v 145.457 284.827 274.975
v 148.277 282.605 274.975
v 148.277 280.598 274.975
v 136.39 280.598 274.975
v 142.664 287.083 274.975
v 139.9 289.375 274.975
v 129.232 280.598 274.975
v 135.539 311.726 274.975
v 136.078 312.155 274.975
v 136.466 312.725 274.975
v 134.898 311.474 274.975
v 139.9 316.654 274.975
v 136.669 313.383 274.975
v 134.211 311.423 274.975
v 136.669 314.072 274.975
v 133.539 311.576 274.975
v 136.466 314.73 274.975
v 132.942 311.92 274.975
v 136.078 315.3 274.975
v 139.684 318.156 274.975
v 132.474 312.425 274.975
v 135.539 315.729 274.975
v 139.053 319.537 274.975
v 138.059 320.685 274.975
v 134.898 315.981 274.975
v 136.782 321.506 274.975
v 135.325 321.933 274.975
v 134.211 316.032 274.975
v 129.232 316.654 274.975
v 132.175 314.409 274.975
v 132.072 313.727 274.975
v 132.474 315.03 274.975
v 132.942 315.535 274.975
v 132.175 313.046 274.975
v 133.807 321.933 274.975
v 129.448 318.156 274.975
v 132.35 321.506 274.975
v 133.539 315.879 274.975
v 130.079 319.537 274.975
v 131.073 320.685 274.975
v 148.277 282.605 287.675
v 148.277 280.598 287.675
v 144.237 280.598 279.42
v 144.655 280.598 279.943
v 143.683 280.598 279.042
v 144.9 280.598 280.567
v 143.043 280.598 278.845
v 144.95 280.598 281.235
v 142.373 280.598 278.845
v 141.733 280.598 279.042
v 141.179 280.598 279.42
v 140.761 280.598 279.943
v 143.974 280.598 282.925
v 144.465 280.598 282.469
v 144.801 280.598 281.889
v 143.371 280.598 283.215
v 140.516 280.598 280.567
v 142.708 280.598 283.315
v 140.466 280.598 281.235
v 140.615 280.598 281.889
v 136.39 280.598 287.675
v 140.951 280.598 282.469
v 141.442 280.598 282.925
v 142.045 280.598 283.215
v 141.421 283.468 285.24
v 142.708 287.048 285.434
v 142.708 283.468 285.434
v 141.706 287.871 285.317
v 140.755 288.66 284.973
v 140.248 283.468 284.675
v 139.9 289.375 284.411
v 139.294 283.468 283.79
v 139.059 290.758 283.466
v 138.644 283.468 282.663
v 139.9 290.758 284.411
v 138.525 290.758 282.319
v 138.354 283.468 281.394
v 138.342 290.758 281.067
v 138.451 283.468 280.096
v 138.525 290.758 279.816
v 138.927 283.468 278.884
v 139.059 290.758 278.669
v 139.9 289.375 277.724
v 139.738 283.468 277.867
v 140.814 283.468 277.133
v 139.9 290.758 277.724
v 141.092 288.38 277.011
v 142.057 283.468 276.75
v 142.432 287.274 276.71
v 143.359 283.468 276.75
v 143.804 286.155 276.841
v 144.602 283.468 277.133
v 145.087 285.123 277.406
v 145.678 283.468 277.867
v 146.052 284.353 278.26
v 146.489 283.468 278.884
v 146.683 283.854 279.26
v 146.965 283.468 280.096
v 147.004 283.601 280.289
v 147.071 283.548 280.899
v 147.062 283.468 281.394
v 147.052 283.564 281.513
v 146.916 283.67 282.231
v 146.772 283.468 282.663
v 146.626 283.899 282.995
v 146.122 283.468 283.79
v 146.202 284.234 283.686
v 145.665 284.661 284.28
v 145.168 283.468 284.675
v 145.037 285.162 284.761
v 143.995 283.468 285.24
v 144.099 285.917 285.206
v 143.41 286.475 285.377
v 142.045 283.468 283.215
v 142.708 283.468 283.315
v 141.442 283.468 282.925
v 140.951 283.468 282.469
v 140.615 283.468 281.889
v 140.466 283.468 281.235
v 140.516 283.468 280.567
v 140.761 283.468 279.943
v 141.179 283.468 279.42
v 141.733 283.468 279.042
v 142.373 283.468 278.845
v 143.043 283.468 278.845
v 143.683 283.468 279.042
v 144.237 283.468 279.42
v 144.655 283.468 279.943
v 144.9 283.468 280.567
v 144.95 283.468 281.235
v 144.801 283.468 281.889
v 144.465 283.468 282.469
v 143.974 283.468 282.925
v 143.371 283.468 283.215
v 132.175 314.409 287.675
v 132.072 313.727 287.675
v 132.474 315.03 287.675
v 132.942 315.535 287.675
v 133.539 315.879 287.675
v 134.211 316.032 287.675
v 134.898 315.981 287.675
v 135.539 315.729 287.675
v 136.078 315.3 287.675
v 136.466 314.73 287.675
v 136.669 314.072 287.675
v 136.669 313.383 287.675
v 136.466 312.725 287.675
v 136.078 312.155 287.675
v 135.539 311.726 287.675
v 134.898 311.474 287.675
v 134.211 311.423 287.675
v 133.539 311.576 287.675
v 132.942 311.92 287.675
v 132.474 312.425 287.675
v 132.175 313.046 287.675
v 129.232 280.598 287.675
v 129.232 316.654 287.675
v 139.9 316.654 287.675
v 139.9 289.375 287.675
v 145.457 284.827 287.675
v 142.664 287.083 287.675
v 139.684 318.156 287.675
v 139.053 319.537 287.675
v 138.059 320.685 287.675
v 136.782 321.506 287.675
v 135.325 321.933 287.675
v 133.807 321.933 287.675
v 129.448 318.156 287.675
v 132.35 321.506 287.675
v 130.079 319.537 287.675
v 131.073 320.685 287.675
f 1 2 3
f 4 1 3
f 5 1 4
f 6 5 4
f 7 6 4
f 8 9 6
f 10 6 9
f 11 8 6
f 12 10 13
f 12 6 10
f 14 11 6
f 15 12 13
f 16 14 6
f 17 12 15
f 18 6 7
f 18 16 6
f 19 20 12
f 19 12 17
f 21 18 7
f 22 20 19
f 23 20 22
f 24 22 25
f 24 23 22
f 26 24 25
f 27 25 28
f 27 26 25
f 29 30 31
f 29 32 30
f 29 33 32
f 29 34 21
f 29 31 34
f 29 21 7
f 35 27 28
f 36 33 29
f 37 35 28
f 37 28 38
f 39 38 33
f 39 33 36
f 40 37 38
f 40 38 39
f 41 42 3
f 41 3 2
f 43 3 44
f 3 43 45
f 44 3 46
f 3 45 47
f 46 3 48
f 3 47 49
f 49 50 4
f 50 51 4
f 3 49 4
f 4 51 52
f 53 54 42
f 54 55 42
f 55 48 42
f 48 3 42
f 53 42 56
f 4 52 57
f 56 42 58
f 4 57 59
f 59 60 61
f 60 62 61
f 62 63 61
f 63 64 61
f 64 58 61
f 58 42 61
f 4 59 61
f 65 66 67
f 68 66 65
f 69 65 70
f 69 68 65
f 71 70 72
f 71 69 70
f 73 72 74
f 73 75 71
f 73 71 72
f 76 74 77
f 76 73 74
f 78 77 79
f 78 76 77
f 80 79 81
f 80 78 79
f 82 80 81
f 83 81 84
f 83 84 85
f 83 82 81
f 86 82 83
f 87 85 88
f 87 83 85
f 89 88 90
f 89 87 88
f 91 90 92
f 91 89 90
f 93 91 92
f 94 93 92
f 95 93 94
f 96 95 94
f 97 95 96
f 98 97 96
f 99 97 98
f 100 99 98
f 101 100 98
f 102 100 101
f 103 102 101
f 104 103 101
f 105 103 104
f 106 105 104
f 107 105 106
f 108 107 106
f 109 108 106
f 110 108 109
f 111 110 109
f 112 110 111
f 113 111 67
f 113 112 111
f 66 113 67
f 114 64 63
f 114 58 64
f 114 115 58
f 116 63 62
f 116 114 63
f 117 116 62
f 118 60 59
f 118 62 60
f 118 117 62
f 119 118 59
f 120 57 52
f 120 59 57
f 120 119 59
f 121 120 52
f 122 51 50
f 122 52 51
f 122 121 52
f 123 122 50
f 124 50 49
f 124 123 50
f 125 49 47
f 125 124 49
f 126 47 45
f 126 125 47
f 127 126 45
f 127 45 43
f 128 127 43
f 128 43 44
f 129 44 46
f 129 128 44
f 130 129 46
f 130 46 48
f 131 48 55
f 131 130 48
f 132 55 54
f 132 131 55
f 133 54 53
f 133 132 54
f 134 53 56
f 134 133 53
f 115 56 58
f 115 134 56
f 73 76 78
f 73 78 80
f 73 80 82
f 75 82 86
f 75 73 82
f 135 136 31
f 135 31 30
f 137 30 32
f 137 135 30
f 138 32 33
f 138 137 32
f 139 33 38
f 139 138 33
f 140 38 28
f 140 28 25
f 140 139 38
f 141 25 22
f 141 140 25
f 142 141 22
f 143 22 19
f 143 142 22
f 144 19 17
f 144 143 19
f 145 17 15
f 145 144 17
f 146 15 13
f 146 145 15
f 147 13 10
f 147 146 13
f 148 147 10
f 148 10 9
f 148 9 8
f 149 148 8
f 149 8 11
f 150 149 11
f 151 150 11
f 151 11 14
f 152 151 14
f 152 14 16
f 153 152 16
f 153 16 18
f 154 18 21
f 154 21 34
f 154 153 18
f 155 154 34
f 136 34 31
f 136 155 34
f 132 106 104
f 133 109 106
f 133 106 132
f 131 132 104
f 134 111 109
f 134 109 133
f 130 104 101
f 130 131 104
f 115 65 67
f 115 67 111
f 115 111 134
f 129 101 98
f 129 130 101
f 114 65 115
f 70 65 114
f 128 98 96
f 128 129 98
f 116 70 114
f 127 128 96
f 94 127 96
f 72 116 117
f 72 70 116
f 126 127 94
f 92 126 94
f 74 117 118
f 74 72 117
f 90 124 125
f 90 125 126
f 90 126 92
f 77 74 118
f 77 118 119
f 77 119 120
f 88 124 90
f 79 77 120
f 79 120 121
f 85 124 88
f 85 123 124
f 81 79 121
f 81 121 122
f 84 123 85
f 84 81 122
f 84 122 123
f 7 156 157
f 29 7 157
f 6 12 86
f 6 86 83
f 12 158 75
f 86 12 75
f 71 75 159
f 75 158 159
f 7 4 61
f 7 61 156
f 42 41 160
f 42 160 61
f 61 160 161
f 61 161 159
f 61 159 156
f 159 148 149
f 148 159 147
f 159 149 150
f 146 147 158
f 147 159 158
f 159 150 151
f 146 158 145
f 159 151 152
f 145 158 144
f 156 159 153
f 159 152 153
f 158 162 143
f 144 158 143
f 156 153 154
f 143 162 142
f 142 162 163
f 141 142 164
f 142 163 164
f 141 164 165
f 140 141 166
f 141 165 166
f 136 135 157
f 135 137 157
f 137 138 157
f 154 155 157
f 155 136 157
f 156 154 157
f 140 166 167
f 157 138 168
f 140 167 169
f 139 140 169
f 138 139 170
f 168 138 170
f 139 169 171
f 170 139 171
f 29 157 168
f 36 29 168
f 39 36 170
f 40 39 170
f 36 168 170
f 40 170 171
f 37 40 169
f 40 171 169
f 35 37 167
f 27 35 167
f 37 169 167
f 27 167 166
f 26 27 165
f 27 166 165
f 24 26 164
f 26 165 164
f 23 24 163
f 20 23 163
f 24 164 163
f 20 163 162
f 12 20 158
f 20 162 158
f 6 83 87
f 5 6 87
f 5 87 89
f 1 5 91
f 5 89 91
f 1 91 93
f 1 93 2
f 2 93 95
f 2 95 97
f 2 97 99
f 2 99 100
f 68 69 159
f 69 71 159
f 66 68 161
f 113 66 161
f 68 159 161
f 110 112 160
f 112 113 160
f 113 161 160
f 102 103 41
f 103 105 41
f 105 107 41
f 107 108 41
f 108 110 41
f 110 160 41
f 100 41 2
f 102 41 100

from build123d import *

# Parameters (mm, degrees)
SKETCH1_R           = 2.3114
BOSS_EXTRUDE1_DEPTH = 12.7
SKETCH2_R           = 2.3114
CUT_EXTRUDE1_DEPTH  = 12.7
SKETCH6_W           = 14.121517248
SKETCH6_H           = 29.833964346
CUT_EXTRUDE2_DEPTH  = 12.7
SKETCH7_W           = 28.687814756
SKETCH7_H           = 15.668419498
CUT_EXTRUDE3_DEPTH  = 12.7


with BuildPart() as part:
    # Sketch1 → Boss-Extrude1 (new body)
    with BuildSketch(Plane(origin=(0, 0, 287.67498399), x_dir=(-1, 0, 0), z_dir=(0, 0, -1))):
        with BuildLine():
            Line((-152.251778141, 257.179185564), (-150.258610496, 257.179185564))
            Line((-150.258610496, 257.179185564), (-150.258610494, 278.616785564))
            ThreePointArc((-150.258610494, 278.616785564), (-149.678330448, 280.017705521), (-148.277410491, 280.597985567))
            Line((-148.277410491, 280.597985567), (-136.390210491, 280.597985564))
            Line((-136.390210491, 280.597985564), (-136.390210491, 279.429585564))
            Line((-136.390210491, 279.429585564), (-148.277410491, 279.429585567))
            ThreePointArc((-148.277410491, 279.429585567), (-148.852146887, 279.19152196), (-149.090210496, 278.616785564))
            Line((-149.090210496, 278.616785564), (-149.090210494, 277.111994182))
            Line((-149.090210494, 277.111994182), (-129.232034093, 277.111994182))
            Line((-129.232034093, 277.111994182), (-129.232034093, 316.653648997))
            ThreePointArc((-129.232034093, 316.653648997), (-134.566034093, 321.987648997), (-139.900034093, 316.653648997))
            Line((-139.900034093, 316.653648997), (-139.900034093, 289.375013802))
            ThreePointArc((-139.900034093, 289.375013802), (-144.05701735, 285.950698605), (-148.277410489, 282.604846529))
            ThreePointArc((-148.277410489, 282.604846529), (-151.211817414, 281.317505148), (-152.251778141, 278.286585564))
            Line((-152.251778141, 278.286585564), (-152.251778141, 257.179185564))
        make_face()
        with Locations((-134.383610491, 313.727499576)):
            Circle(SKETCH1_R, mode=Mode.SUBTRACT)
    extrude(amount=BOSS_EXTRUDE1_DEPTH)

    # Sketch2 → Cut-Extrude1 (cut)
    with BuildSketch(Plane.ZY.offset(-150.25861052)):
        with Locations((281.230197131, 274.312688508)):
            Circle(SKETCH2_R)
        with Locations((281.230197131, 261.612688508)):
            Circle(SKETCH2_R)
    extrude(amount=-CUT_EXTRUDE1_DEPTH, mode=Mode.SUBTRACT)

    # Sketch5 → CBORE for #8 Button Head Cap Screw1 (revolve, cut)
    with BuildSketch(Plane(origin=(142.708000895, 290.757985564, 281.067357509), x_dir=(0, 0, 1), z_dir=(1, 0, 0))):
        Polygon((0, 0), (0, 33.5788), (2.2479, 33.5788), (2.2479, 7.2898), (4.36626, 7.2898), (4.36626, 0), align=None)
    revolve(axis=Axis((142.708000895, 297.107985564, 281.067357509), (0, -1, 0)), mode=Mode.SUBTRACT)

    # Sketch6 → Cut-Extrude2 (cut)
    with BuildSketch(Plane(origin=(0, 0, 274.97498399), x_dir=(-1, 0, 0), z_dir=(0, 0, -1))):
        with Locations((-155.338169113, 267.687864356)):
            Rectangle(SKETCH6_W, SKETCH6_H)
    extrude(amount=-CUT_EXTRUDE2_DEPTH, mode=Mode.SUBTRACT)

    # Sketch7 → Cut-Extrude3 (cut)
    with BuildSketch(Plane(origin=(0, 0, 274.97498399), x_dir=(-1, 0, 0), z_dir=(0, 0, -1))):
        with Locations((-133.933503111, 272.763775818)):
            Rectangle(SKETCH7_W, SKETCH7_H)
    extrude(amount=-CUT_EXTRUDE3_DEPTH, mode=Mode.SUBTRACT)


solid = part.part
